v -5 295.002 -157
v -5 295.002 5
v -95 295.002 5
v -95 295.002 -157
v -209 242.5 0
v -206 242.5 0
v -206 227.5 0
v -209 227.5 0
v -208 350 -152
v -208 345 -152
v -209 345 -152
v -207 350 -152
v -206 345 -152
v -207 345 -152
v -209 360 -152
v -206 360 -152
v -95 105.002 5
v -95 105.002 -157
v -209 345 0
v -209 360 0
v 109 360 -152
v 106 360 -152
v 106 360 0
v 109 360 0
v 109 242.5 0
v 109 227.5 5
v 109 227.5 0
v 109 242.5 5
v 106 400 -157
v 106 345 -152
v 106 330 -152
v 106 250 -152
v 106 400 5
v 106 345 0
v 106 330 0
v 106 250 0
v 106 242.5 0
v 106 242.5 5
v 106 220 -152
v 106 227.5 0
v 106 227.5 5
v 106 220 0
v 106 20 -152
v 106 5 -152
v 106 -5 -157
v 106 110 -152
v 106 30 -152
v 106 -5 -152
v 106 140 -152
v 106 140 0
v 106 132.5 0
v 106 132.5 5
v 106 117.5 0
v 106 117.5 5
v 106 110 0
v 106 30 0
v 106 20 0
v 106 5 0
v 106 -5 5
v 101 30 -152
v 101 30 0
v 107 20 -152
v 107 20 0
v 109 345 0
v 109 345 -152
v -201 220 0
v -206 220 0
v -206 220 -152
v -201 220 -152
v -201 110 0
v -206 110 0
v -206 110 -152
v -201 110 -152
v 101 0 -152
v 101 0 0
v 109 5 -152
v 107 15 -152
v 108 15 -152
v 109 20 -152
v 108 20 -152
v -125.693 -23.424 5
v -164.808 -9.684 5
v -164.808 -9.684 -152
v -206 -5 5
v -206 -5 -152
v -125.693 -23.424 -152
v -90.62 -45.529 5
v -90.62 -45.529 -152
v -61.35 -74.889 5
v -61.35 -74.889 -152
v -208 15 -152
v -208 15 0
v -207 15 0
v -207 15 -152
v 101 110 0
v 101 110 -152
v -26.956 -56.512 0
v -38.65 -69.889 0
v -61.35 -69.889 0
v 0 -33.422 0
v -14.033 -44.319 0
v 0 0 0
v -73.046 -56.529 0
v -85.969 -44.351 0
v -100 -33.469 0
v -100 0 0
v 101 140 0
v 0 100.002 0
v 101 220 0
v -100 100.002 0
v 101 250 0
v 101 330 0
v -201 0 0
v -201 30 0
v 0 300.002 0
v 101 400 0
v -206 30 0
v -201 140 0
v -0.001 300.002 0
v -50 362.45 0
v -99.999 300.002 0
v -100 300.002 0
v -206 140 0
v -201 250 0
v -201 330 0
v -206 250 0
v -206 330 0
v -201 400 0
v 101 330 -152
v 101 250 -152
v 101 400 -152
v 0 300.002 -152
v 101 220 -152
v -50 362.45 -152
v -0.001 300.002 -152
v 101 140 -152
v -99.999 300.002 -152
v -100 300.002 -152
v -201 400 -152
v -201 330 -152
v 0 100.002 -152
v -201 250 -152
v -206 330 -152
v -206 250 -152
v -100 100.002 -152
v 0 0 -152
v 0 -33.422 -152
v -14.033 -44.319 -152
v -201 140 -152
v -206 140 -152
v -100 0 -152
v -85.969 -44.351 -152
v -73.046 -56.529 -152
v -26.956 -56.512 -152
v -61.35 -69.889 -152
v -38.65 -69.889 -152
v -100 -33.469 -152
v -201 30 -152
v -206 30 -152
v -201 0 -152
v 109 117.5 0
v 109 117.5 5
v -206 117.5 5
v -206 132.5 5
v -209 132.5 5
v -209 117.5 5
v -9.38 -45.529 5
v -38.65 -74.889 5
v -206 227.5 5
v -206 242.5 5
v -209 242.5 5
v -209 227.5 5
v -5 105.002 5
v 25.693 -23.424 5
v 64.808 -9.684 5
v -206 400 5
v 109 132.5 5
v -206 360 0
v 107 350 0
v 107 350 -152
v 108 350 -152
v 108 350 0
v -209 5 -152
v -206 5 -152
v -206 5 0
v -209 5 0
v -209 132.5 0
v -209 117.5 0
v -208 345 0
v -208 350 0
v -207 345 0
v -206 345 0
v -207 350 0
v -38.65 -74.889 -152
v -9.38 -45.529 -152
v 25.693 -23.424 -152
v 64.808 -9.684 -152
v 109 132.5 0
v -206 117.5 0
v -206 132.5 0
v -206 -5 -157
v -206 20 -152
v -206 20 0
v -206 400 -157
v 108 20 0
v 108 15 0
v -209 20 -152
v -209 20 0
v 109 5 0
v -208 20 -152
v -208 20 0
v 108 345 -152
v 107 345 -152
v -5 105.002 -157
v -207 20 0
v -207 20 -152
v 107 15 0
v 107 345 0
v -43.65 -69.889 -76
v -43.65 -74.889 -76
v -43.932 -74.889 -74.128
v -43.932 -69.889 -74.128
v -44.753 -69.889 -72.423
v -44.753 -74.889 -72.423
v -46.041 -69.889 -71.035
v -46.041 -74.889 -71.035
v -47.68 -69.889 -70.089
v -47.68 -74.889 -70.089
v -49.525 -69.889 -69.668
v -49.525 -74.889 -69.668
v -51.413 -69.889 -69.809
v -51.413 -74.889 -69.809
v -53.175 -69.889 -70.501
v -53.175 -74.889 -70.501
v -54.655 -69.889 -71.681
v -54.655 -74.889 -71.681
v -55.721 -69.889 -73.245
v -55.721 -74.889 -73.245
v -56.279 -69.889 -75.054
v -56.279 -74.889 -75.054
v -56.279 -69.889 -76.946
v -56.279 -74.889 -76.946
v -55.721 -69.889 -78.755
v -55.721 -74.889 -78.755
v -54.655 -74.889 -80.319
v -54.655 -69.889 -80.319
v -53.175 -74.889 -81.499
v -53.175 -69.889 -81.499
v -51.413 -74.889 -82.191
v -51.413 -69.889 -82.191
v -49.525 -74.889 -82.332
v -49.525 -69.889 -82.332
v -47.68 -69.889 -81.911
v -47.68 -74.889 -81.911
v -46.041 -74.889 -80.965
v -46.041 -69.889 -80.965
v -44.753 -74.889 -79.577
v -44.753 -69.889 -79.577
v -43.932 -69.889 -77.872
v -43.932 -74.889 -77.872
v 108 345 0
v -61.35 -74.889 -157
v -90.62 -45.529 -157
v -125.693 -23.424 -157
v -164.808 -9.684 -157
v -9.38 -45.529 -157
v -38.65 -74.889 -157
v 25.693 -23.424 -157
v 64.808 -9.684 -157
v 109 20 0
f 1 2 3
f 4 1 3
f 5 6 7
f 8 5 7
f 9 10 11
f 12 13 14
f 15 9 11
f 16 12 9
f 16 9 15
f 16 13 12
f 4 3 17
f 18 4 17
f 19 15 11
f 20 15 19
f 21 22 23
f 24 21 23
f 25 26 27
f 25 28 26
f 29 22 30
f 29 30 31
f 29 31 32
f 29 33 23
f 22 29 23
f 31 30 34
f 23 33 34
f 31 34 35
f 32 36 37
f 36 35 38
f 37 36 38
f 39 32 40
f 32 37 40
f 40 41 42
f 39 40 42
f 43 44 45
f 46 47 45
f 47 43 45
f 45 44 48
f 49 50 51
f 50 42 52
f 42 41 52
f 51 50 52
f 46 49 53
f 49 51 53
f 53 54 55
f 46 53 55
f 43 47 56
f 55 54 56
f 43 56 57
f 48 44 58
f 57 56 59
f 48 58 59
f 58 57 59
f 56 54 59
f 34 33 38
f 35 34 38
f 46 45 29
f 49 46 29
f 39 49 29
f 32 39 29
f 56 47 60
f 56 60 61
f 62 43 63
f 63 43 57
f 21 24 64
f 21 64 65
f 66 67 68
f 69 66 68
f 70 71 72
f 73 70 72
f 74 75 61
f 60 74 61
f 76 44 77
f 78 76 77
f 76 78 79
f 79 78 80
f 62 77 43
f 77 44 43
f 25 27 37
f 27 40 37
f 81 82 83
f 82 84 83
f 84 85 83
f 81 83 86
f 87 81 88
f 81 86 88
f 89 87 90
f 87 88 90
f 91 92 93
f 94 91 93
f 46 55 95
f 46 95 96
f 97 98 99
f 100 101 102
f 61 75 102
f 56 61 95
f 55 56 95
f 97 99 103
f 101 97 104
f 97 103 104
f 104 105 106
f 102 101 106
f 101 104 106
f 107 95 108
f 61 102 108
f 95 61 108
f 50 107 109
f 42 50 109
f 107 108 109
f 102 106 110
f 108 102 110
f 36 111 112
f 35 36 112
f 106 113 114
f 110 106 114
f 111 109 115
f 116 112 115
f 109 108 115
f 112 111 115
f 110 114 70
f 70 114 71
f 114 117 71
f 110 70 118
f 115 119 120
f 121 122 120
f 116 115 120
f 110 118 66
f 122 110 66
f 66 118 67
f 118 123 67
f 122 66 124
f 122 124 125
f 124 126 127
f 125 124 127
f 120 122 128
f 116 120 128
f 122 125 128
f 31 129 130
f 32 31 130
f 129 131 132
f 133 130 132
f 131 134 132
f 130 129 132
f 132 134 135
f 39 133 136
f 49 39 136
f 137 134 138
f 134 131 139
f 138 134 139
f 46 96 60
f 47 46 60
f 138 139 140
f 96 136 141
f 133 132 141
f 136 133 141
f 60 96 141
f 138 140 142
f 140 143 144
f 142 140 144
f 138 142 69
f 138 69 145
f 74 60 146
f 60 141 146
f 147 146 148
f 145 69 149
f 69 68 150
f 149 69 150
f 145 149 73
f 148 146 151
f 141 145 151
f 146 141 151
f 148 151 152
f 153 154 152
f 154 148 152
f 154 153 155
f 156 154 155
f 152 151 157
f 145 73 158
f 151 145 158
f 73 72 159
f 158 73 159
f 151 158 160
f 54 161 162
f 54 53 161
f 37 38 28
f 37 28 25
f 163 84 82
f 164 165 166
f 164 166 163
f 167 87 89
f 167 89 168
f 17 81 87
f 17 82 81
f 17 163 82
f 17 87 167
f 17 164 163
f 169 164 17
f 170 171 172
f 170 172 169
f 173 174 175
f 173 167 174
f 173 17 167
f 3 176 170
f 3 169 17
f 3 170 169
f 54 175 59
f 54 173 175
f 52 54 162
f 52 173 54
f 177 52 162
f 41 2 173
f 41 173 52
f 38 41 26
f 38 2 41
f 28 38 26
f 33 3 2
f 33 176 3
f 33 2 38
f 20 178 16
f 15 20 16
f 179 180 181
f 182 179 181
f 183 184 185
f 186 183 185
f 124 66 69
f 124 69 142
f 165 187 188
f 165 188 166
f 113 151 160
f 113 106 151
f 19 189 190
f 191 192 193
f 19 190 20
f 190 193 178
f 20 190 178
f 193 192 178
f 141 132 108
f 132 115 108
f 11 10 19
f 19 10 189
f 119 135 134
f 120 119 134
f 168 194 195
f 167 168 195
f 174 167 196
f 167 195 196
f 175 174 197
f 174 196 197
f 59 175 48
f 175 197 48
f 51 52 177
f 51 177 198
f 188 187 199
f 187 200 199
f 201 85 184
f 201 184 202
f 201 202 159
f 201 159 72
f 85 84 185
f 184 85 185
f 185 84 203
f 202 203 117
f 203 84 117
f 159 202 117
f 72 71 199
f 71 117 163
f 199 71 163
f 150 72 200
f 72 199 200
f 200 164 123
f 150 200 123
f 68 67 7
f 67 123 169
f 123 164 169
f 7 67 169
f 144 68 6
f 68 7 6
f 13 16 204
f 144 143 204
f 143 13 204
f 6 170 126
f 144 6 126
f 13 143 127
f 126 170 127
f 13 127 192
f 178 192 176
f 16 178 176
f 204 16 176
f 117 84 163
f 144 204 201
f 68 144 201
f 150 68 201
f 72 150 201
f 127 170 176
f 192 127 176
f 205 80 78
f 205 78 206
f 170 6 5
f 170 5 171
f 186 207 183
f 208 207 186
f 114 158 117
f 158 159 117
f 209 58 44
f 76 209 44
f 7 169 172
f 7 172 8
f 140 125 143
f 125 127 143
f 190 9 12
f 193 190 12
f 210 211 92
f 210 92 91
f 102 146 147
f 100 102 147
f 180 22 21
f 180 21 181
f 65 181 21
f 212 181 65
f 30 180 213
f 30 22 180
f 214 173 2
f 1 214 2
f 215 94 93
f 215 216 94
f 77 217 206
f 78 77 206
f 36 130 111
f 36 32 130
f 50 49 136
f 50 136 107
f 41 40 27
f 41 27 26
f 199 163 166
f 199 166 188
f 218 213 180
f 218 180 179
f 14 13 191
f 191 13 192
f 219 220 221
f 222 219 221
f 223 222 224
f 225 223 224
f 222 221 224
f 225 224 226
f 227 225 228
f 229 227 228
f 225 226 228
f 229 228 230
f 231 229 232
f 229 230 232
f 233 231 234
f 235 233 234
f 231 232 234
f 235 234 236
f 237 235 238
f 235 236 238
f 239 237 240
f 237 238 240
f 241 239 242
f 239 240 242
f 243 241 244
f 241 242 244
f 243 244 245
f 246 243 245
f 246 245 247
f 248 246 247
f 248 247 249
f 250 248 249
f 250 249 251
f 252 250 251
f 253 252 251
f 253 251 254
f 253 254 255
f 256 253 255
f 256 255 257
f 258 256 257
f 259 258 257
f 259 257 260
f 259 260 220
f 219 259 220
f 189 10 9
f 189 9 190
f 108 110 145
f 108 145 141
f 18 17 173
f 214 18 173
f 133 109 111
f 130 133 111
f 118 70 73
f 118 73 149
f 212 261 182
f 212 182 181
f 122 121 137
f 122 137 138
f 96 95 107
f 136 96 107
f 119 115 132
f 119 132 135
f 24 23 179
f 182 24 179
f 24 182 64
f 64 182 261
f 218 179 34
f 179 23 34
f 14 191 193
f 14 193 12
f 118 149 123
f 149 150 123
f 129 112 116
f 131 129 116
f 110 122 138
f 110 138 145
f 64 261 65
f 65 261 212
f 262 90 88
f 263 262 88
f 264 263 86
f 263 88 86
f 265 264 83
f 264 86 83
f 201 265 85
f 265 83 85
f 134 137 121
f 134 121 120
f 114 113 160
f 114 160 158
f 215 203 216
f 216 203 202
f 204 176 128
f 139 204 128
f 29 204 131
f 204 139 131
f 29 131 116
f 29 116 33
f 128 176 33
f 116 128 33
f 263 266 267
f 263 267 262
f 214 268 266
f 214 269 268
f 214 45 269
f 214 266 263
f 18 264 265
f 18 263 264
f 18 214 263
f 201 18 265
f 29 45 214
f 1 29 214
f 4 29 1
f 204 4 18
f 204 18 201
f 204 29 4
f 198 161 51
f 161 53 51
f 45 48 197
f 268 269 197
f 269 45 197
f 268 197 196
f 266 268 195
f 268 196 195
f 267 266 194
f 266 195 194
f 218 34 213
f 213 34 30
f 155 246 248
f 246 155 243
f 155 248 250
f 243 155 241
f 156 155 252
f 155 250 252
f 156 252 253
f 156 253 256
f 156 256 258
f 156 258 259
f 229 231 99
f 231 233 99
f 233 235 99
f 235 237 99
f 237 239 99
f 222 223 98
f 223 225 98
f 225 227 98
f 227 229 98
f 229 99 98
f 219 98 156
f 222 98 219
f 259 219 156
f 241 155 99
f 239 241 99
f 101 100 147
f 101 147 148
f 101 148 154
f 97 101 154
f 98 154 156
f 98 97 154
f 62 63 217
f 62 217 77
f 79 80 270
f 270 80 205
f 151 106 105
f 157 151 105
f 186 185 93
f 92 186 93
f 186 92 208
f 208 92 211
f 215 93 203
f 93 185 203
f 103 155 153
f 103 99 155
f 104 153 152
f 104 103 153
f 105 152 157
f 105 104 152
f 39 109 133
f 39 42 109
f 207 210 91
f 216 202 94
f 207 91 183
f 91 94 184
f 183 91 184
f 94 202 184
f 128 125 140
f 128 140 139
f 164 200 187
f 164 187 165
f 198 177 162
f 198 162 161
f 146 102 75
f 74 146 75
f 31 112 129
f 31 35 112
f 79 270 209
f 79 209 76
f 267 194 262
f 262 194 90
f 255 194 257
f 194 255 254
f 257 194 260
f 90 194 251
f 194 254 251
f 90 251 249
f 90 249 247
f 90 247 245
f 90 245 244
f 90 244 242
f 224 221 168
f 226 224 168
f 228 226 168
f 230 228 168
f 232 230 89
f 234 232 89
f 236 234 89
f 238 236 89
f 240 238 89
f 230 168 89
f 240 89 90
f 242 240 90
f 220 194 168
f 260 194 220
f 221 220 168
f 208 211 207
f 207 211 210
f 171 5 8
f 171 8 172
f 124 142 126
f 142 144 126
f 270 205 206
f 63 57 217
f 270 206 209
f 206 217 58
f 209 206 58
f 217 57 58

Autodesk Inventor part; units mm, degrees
ref_plane "YZ Plane" through (0, 0, 0) normal (1, 0, 0) x (0, 1, 0)
sketch "Boceto1" plane through (0, 0, 0) normal (0, 0, 1) x (1, 0, 0)
  line L0 (0, 0) -> (100, 0)
  line L1 (0, 300.0017) -> (0, 100.0017)
  line L2 (0, 0) -> (101, 0)
  line L3 (101, 0) -> (101, 400)
  line L4 (101, 400) -> (0, 400)
  line L5 (0, 300.0017) -> (0, 100.0017)
  line L6 (0, 0) -> (98.1777, 0) construction
  line L7 (98.1777, 0) -> (98.1777, 330) construction
  line L8 (98.1777, 330) -> (0, 330) construction
  line L9 (0, 330) -> (0, 0) construction
  line L10 (0, 300.0017) -> (-100, 300.0017) construction
  line L11 (-100, 300.0017) -> (-100, 100.0017) construction
  line L12 (-100, 100.0017) -> (0, 100.0017) construction
  line L13 (0, 100.0017) -> (0, 300.0017) construction
  line L14 (0, 300.0017) -> (-100, 300.0017)
  line L15 (-100, 300.0017) -> (-100, 100.0017)
  line L16 (-100, 100.0017) -> (0, 100.0017)
  line L17 (0, 100.0017) -> (0, 300.0017)
  line L18 (-100, 0) -> (-201, 0)
  line L19 (-201, 0) -> (-201, 400)
  line L20 (-201, 400) -> (-100, 400)
  line L21 (-100, 300.0017) -> (-100, 100.0017)
  line L22 (-100, 0) -> (0, 0)
  line L23 (-100, 400) -> (0, 400)
  line L24 (-95, 105.0017) -> (-5, 105.0017)
  line L25 (-5, 105.0017) -> (-5, 295.0017)
  line L26 (-5, 295.0017) -> (-95, 295.0017)
  line L27 (-95, 295.0017) -> (-95, 105.0017)
  line L28 (106, 400) -> (106, -5)
  line L29 (106, -5) -> (-206, -5)
  line L30 (-206, -5) -> (-206, 400)
  line L31 (-206, 400) -> (-201, 400)
  line L32 (101, 400) -> (106, 400)
  line L33 (-100, 100.0017) -> (-100, 0) construction
  line L34 (-50, -5) -> (-50, -75) construction
  line L35 (-56.35, -74.8888) -> (-43.65, -74.8888)
  line L36 (-43.65, -74.8888) -> (-38.65, -74.8888)
  line L37 (-56.35, -74.8888) -> (-61.35, -74.8888)
  arc A0 (-61.35, -74.8888) -> (-206, -5) centre (-206.1755, -189.9999) ccw
  arc A1 (106, -5) -> (-38.65, -74.8888) centre (106.1755, -189.9999) ccw
  line L38 (-38.65, -74.8888) -> (-38.65, -69.8888)
  line L39 (-61.35, -74.8888) -> (-61.35, -69.8888)
  arc A2 (-61.35, -69.8888) -> (-201, 0) centre (-206.2343, -184.9259) ccw
  arc A3 (98.1777, 0) -> (-38.65, -69.8888) centre (106.3177, -184.8208) ccw
  line L40 (-61.35, -69.8888) -> (-38.65, -69.8888)
  line L41 (-100, 0) -> (-100, -33.4687)
  line L42 (0, 0) -> (0, -33.4222)
  line L43 (-100, 400) -> (-100, 300.0017) construction
  dimension "d2" = 101
  dimension "d9" = 101
  dimension "d11" = 400
  dimension "d12" = 100
  dimension "d13" = 200
  dimension "d14" = 100
  dimension "d15" = 5
  dimension "d16" = 5
  dimension "d17" = 5
  dimension "d18" = 5
  dimension "d19" = 5
  dimension "d20" = 5
  dimension "d22" = 70
  dimension "d23" = 12.7
  dimension "d24" = 6.35
  dimension "d27" = 302
  dimension "d28" = 5
  dimension "d29" = 5
  dimension "d30" = 185
  dimension "d31" = 185
  dimension "d32" = 5
  dimension "d33" = 5
  dimension "d34" = 185
  dimension "d35" = 185
  dimension "d36" = 5
extrude "Extrusión1" add sketch "Boceto1" against normal blind 152 contours L0 A3 L29 L42 | L0 L2 L3 L32 L28 L29 A3 | L41 L29 A2 L18 | L29 A3 L42 | L29 A1 L38 A3 | A2 L29 L30 L31 L19 | L41 A2 L29 | A2 L39 A0 L29 | L38 L36 L35 L37 L39 L40 | L1 L16 L15 L14
sketch "Boceto2" plane through (0, 0, 0) normal (0, 0, 1) x (1, 0, 0)
  line L0 (-206, 400) -> (-206, -5) projected
  line L1 (106, -5) -> (106, 400) projected
  arc A0 (106, -5) -> (-38.65, -74.8888) centre (106.1755, -189.9999) ccw projected
  arc A1 (-61.35, -74.8888) -> (-206, -5) centre (-206.1755, -189.9999) ccw projected
  line L2 (-61.35, -74.8888) -> (-38.65, -74.8888) projected
  line L3 (-206, 400) -> (106, 400)
  line L4 (-201, 0) -> (-201, 400) projected
  line L5 (0, 300.0017) -> (-100, 300.0017) projected
  line L6 (0, 100.0017) -> (0, 300.0017) projected
  line L7 (-95, 105.0017) -> (-95, 295.0017) projected
  line L8 (-5, 295.0017) -> (-5, 105.0017) projected
  line L9 (-5, 105.0017) -> (-95, 105.0017) projected
  line L10 (-95, 295.0017) -> (-5, 295.0017) projected
  point P0 (0, 0)
extrude "Extrusión2" add sketch "Boceto2" along normal blind 5
ref_plane "Plano de trabajo1" through (106, -5, -152) normal (0, 0, -1) x (-1, 0, 0)
sketch "Boceto5" plane through (106, -5, -152) normal (0, 0, -1) x (-1, 0, 0)
  line L0 (312, 0) -> (312, 405) projected
  line L1 (312, 405) -> (307, 405) projected
  line L2 (5, 405) -> (307, 405) projected
  line L3 (5, 405) -> (0, 405) projected
  line L4 (0, 405) -> (0, 0) projected
  arc A0 (144.65, -69.8888) -> (0, 0) centre (-0.1755, -184.9999) ccw projected
  line L5 (144.65, -69.8888) -> (167.35, -69.8888) projected
  arc A1 (312, 0) -> (167.35, -69.8888) centre (312.1755, -184.9999) ccw projected
  line L6 (201, 110.0017) -> (111, 110.0017) projected
  line L7 (111, 110.0017) -> (111, 300.0017) projected
  line L8 (111, 300.0017) -> (201, 300.0017) projected
  line L9 (201, 300.0017) -> (201, 110.0017) projected
  point P0 (106, 5)
extrude "Extrusión3" add sketch "Boceto5" along normal blind 5
sketch "Boceto6" plane through (-61.35, -74.8888, 5) normal (0, -1, 0) x (1, 0, 0)
  line L0 (-144.65, -162) -> (167.35, -162) construction
  line L1 (11.35, -162) -> (11.35, -25.687) construction
  line L2 (0, -5) -> (0, -157) construction
  line L3 (0, -81) -> (22.7, -81) construction
  line L4 (22.7, -5) -> (22.7, -157) construction
  circle A0 centre (11.35, -81) radius 6.35
  point P0 (61.35, -5)
  dimension "d76" = 12.7
extrude "Extrusión4" cut sketch "Boceto6" against normal blind 5
sketch "Boceto7" plane through (-206, -5, 5) normal (-1, 0, 0) x (0, 0, 1)
  line L0 (-162, 0) -> (0, 0) construction
  line L1 (-81, 0) -> (-81, 5) construction
  line L2 (-81, 5) -> (-81, 35) construction
  line L3 (-81, 35) -> (-81, 115) construction
  line L4 (-81, 115) -> (-81, 145) construction
  line L5 (-81, 145) -> (-81, 225) construction
  line L6 (-81, 225) -> (-81, 255) construction
  line L7 (-81, 255) -> (-81, 335) construction
  line L8 (-157, 35) -> (-5, 35)
  line L9 (-5, 35) -> (-5, 115)
  line L10 (-5, 115) -> (-157, 115)
  line L11 (-157, 115) -> (-157, 35)
  line L12 (0, 405) -> (0, 0) projected
  line L13 (-162, 0) -> (-162, 405) projected
  line L14 (-5, 225) -> (-157, 225)
  line L15 (-157, 225) -> (-157, 145)
  line L16 (-157, 145) -> (-5, 145)
  line L17 (-5, 145) -> (-5, 225)
  line L18 (-5, 335) -> (-157, 335)
  line L19 (-157, 335) -> (-157, 255)
  line L20 (-157, 255) -> (-5, 255)
  line L21 (-5, 255) -> (-5, 335)
  point P0 (-5, 5)
  dimension "d47" = 5
  dimension "d48" = 30
  dimension "d49" = 80
  dimension "d50" = 30
  dimension "d51" = 80
  dimension "d52" = 30
  dimension "d53" = 80
  dimension "d54" = 5
  dimension "d55" = 5
  dimension "d58" = 110
sketch "Boceto8" plane through (106, -5, 5) normal (1, 0, 0) x (0, 0, -1)
  line L0 (5, 335) -> (157, 335) projected
  line L1 (157, 335) -> (157, 255) projected
  line L2 (157, 255) -> (5, 255) projected
  line L3 (5, 255) -> (5, 335) projected
  line L4 (5, 225) -> (157, 225) projected
  line L5 (157, 225) -> (157, 145) projected
  line L6 (157, 145) -> (5, 145) projected
  line L7 (5, 145) -> (5, 225) projected
  line L8 (5, 115) -> (157, 115) projected
  line L9 (157, 115) -> (157, 35) projected
  line L10 (157, 35) -> (5, 35) projected
  line L11 (5, 35) -> (5, 115) projected
  point P0 (5, 5)
extrude "Extrusión5" cut sketch "Boceto7" against normal blind 5
extrude "Extrusión6" cut sketch "Boceto8" against normal blind 5
sketch "Boceto9" plane through (106, -5, -152) normal (0, 0, 1) x (1, 0, 0)
  line L0 (0, 405) -> (0, 0) construction
  line L1 (0, 372.4568) -> (-312, 372.4568) construction
  line L2 (-312, 0) -> (-312, 405) construction
  line L3 (-156, 372.4568) -> (-156, 300.0017) construction
  line L4 (-111, 300.0017) -> (-201, 300.0017) construction
  line L5 (-312, 405) -> (0, 405) construction
  line L6 (-156, 405) -> (-156, 385) construction
  line L7 (-106, 405) -> (-106, 305) construction
  line L8 (-106, 305) -> (-206, 305) construction
  line L9 (-206, 305) -> (-106, 305)
  line L10 (-206, 305) -> (-156, 367.45)
  line L11 (-106, 305) -> (-156, 367.45)
  point P0 (-106, 5)
  dimension "d71" = 20
  dimension "d72" = 100
  dimension "d73" = 80
extrude "Extrusión7" add sketch "Boceto9" along normal blind 152
thread "Rosca1" size "M14x2" class "6H" standard "ANSI Metric M Profile" full length
sketch "Boceto11" plane through (106, -5, 5) normal (1, 0, 0) x (0, 0, -1)
  line L0 (157, 405) -> (157, 335) projected
  line L1 (5, 350) -> (157, 350)
  line L2 (157, 350) -> (157, 365)
  line L3 (157, 365) -> (5, 365)
  line L4 (5, 365) -> (5, 350)
  line L5 (5, 105.0017) -> (5, 305.0017) projected
  line L6 (5, 10) -> (157, 10)
  line L7 (157, 10) -> (157, 25)
  line L8 (157, 25) -> (5, 25)
  line L9 (5, 25) -> (5, 10)
  line L10 (162, 405) -> (0, 405) projected
  line L11 (157, 35) -> (5, 35) projected
  line L12 (0, 405) -> (0, 0) projected
  line L13 (5, 122.5) -> (0, 122.5)
  line L14 (0, 122.5) -> (0, 137.5)
  line L15 (0, 137.5) -> (5, 137.5)
  line L16 (5, 137.5) -> (5, 122.5)
  line L17 (5, 232.5) -> (0, 232.5)
  line L18 (0, 232.5) -> (0, 247.5)
  line L19 (0, 247.5) -> (5, 247.5)
  line L20 (5, 247.5) -> (5, 232.5)
  line L21 (157, 255) -> (5, 255) projected
  line L22 (5, 225) -> (157, 225) projected
  line L23 (157, 145) -> (5, 145) projected
  line L24 (5, 115) -> (157, 115) projected
  point P0 (5, 5)
  dimension "d79" = 152
  dimension "d80" = 40
  dimension "d81" = 15
  dimension "d84" = 15
  dimension "d89" = 10
  dimension "d92" = 7.5
  dimension "d93" = 7.5
  dimension "d94" = 7.5
  dimension "d95" = 7.5
extrude "Extrusión8" add sketch "Boceto11" along normal blind 3 contours L0 L1 L4 L3 | L19 L5 L17 L12 | L15 L5 L13 L12 | L9 L8 L7 L6
sketch "Boceto12" plane through (106, 345, -152) normal (0, -1, 0) x (1, 0, 0)
  line L0 (1, 152) -> (2, 152)
  line L1 (2, 152) -> (2, 0)
  line L2 (2, 0) -> (1, 0)
  line L3 (1, 0) -> (1, 152)
  line L4 (0, 152) -> (0, 0) projected
  line L5 (0, 152) -> (3, 152) projected
  line L6 (0, 0) -> (3, 0) projected
  point P0 (-106, 152)
  dimension "d96" = 1
  dimension "d97" = 1
  dimension "d98" = 0
  dimension "d99" = 0
extrude "Extrusión9" cut sketch "Boceto12" against normal blind 5 contours L0 L1 L2 L3
sketch "Boceto13" plane through (106, 20, 0) normal (0, 1, 0) x (1, 0, 0)
  line L0 (2, 0) -> (1, 0)
  line L1 (1, 0) -> (1, 152)
  line L2 (1, 152) -> (2, 152)
  line L3 (2, 152) -> (2, 0)
  line L4 (0, 0) -> (3, 0) projected
  line L5 (0, 0) -> (0, 152) projected
  line L6 (0, 152) -> (3, 152) projected
  point P0 (-106, 0)
  dimension "d102" = 0
  dimension "d103" = 1
  dimension "d104" = 1
  dimension "d105" = 0
extrude "Extrusión10" cut sketch "Boceto13" against normal blind 5 contours L0 L1 L2 L3
ref_plane "Plano de trabajo2" through (-50, -5, -157) normal (1, 0, 0) x (0, 0, -1)
mirror "Simetría1" about plane through (-50, -5, -157) normal (1, 0, 0) of "Extrusión8"
sketch "Boceto14" plane through (-206, 20, 0) normal (0, 1, 0) x (1, 0, 0)
  line L0 (-2, 152) -> (-1, 152)
  line L1 (-1, 152) -> (-1, 0)
  line L2 (-1, 0) -> (-2, 0)
  line L3 (-2, 0) -> (-2, 152)
  line L4 (0, 152) -> (-3, 152) projected
  line L5 (-3, 152) -> (-3, 0) projected
  line L6 (0, 0) -> (-3, 0) projected
  point P0 (206, 0)
  dimension "d108" = 0
  dimension "d109" = 1
  dimension "d110" = 1
  dimension "d111" = 0
extrude "Extrusión11" cut sketch "Boceto14" against normal blind 5 contours L0 L1 L2 L3
sketch "Boceto15" plane through (-206, 345, -152) normal (0, -1, 0) x (1, 0, 0)
  line L0 (-1, 0) -> (-2, 0)
  line L1 (-2, 0) -> (-2, 152)
  line L2 (-2, 152) -> (-1, 152)
  line L3 (-1, 152) -> (-1, 0)
  line L4 (0, 0) -> (-3, 0) projected
  line L5 (-3, 0) -> (-3, 152) projected
  line L6 (0, 152) -> (-3, 152) projected
  point P0 (206, 152)
  dimension "d114" = 0
  dimension "d115" = 1
  dimension "d116" = 1
  dimension "d117" = 0
extrude "Extrusión12" cut sketch "Boceto15" against normal blind 5 contours L0 L1 L2 L3
equation "\"d16\" = d15"
equation "\"d17\" = d15"
equation "\"d18\" = d15"
equation "\"d19\" = d15"
equation "\"d20\" = d15"
equation "\"d24\" = 0.5 * d23"
equation "\"d31\" = d30"
equation "\"d84\" = d81"
properties part number "Contenedor" material "Acrílico, claro"
